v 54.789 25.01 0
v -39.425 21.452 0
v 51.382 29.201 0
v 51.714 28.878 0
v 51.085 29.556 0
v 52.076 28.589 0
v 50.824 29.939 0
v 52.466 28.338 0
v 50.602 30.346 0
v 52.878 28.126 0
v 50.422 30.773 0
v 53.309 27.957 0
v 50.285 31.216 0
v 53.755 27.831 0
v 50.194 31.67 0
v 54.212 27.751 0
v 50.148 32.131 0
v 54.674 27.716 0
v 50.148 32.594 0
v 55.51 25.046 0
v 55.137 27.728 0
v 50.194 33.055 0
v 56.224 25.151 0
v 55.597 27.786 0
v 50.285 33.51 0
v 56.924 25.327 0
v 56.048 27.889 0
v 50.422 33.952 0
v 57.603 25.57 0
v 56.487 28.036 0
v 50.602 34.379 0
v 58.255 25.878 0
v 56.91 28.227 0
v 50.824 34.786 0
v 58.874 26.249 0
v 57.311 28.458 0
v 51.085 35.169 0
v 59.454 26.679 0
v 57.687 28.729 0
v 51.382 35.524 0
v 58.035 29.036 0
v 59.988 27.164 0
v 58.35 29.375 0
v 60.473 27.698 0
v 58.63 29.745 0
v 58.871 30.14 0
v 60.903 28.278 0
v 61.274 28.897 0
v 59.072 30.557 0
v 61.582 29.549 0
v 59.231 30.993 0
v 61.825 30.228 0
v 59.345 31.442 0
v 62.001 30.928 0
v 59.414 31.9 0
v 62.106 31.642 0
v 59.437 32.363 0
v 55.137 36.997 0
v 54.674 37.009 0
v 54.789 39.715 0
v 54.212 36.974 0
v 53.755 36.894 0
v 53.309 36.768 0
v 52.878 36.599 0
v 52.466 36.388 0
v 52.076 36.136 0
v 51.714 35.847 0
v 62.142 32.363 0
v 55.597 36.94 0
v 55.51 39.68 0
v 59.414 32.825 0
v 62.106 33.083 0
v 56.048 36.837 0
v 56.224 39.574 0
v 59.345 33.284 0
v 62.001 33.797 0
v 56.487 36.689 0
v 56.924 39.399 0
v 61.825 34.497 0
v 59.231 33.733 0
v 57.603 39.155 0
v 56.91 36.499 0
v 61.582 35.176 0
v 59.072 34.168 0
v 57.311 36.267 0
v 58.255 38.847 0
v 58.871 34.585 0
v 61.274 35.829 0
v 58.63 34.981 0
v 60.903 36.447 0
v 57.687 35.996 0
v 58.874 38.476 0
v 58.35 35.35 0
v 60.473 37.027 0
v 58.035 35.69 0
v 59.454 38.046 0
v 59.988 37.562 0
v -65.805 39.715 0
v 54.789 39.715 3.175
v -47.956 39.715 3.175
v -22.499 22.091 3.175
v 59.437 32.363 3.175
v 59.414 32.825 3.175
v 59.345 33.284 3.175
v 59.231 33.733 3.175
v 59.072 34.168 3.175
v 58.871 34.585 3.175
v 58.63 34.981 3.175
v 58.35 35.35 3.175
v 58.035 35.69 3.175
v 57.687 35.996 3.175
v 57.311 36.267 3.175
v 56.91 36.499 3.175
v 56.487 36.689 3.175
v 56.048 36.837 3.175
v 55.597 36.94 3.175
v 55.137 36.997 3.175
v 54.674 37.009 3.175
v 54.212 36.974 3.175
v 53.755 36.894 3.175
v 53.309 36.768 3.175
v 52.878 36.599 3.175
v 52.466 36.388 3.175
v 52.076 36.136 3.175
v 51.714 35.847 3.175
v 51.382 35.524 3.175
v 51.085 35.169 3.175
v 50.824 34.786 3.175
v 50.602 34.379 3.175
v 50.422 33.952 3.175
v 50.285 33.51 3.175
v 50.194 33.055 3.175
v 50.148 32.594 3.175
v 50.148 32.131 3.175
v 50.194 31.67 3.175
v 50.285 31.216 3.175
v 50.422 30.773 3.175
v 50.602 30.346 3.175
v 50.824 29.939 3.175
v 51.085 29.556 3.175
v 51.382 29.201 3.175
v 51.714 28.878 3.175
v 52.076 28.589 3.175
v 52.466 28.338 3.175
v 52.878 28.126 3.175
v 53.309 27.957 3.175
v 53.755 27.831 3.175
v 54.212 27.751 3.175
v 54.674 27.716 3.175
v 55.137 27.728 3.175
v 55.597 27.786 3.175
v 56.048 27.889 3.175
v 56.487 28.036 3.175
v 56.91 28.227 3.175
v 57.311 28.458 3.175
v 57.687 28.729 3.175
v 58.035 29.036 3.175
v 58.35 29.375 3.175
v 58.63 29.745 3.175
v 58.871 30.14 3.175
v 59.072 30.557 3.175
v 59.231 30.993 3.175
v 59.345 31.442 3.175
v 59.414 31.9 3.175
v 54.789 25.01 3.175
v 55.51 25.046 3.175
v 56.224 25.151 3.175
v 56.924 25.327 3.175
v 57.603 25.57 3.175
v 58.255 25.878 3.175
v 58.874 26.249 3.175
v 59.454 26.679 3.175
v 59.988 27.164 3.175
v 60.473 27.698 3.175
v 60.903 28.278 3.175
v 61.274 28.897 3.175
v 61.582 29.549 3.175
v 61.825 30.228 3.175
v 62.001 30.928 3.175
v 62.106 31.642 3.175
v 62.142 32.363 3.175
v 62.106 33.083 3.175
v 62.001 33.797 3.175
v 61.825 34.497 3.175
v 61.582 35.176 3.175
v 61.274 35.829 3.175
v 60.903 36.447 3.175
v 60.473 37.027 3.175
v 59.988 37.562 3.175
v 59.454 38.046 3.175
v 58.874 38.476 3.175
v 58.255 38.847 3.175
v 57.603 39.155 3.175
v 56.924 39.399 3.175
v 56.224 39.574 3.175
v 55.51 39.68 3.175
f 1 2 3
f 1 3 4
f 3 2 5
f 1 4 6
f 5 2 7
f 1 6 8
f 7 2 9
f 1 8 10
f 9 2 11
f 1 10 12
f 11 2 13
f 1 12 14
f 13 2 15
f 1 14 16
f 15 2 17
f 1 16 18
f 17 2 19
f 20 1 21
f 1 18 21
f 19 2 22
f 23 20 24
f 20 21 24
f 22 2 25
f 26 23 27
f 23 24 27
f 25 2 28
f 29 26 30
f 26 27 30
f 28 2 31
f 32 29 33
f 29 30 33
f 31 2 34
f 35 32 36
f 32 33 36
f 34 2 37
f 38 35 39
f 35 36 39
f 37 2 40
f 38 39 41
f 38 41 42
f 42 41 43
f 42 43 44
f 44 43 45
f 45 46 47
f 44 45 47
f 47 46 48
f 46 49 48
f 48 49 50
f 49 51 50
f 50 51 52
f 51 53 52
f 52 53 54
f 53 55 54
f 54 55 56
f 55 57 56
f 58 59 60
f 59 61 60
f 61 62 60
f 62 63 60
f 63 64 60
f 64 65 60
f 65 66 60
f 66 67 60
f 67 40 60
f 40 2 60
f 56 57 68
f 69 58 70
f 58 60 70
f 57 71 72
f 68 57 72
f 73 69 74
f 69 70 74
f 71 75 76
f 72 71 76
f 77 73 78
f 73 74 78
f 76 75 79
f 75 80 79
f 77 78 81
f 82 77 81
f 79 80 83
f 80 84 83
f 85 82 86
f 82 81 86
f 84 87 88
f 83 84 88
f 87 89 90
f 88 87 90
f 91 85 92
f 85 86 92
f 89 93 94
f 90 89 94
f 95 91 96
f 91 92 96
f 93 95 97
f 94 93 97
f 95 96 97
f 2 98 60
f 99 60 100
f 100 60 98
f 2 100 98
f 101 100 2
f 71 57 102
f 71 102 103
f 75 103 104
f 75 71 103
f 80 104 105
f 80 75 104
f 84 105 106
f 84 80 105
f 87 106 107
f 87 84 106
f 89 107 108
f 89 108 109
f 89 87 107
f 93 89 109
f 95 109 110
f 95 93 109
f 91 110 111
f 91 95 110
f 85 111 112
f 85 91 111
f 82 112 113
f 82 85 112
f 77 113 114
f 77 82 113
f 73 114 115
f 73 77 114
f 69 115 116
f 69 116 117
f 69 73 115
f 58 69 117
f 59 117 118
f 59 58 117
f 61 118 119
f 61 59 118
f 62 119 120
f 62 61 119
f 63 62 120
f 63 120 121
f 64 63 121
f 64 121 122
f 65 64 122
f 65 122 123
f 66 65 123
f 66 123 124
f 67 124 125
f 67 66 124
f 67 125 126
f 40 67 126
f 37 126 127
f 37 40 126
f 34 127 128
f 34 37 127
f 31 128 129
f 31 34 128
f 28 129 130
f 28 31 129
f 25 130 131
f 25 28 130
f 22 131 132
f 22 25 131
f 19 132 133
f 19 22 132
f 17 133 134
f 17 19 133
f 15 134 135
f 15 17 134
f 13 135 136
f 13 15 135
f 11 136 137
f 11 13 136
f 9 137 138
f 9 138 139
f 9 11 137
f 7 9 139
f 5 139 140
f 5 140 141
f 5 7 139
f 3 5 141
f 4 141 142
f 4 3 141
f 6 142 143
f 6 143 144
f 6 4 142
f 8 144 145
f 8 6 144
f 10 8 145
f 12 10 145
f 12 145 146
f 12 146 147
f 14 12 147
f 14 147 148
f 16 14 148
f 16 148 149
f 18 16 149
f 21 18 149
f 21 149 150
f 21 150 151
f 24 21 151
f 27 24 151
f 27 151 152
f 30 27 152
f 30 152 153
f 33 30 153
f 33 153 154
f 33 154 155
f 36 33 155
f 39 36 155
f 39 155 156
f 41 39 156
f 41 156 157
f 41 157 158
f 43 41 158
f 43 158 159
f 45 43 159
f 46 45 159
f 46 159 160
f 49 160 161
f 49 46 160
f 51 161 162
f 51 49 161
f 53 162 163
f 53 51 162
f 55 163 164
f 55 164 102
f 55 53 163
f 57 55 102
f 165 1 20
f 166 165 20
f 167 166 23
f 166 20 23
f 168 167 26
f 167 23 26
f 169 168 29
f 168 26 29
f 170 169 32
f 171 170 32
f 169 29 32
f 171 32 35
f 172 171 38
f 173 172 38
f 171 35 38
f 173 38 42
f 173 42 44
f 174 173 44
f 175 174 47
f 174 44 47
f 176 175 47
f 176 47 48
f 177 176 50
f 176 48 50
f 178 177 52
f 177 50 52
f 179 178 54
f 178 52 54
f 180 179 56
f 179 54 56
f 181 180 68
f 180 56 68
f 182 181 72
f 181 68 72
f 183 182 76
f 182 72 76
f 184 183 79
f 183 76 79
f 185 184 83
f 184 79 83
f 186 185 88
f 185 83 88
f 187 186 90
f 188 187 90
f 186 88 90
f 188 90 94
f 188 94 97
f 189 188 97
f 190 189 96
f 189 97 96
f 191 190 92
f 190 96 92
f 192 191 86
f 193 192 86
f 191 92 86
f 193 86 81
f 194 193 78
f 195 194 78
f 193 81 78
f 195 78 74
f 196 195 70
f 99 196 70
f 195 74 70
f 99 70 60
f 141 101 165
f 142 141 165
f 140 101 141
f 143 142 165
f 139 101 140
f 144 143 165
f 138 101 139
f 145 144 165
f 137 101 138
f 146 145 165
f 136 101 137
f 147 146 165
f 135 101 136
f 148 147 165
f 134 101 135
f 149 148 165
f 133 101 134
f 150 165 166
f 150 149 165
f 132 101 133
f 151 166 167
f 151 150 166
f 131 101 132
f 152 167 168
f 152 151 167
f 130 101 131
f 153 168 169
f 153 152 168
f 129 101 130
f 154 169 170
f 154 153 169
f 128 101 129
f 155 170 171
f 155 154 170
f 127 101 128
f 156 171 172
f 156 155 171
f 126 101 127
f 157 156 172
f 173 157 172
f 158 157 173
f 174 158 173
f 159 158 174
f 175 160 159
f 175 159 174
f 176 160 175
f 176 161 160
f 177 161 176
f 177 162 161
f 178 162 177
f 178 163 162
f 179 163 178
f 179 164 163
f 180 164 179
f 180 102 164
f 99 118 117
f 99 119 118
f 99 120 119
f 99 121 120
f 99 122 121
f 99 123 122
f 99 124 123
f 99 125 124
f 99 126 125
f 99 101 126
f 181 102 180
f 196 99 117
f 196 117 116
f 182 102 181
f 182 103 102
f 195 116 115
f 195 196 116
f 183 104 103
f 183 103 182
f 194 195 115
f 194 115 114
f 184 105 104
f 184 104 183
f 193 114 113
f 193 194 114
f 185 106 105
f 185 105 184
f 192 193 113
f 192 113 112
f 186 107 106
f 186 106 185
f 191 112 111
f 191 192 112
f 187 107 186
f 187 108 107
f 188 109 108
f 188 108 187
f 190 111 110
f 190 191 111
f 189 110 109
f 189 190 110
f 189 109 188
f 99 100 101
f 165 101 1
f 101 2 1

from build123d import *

# Parameters (mm, degrees)
F0_R     = 4.6477092711
F1_DEPTH = 3.175
F2_SIZE2 = 10.15999
F2_SIZE  = 3.17499


# Not quite as in the source:
# - a fillet or chamfer is up to 0.001 mm smaller than in the source, because OpenCascade refuses the exact size


with BuildPart() as f1:
    # F0 (on Top) → F1 (new body)
    with BuildSketch(Plane.XY):
        with BuildLine():
            Line((54.7894574702, 39.7151075304), (-65.8053308725, 39.7151075304))
            Line((-65.8053308725, 39.7151075304), (-39.4252166152, 21.4519556612))
            Line((-39.4252166152, 21.4519556612), (54.7894574702, 25.0102191872))
            ThreePointArc((54.7894574702, 25.0102191872), (62.1419016418, 32.3626633588), (54.7894574702, 39.7151075304))
        make_face()
        with Locations((54.7894574702, 32.3626633588)):
            Circle(F0_R, mode=Mode.SUBTRACT)
    extrude(amount=F1_DEPTH)

    # F2 (size 3.175 and 10.16 in the source; OpenCascade refuses exactly that, so slightly less here)
    f2_edges = [f1.edges().sort_by_distance(p)[0] for p in [
        (-52.615274, 30.583532, 3.175),
    ]]
    f2_side = f1.faces().sort_by_distance((-52.615274, 30.583532, 1.5875))[0]
    chamfer(f2_edges, length=F2_SIZE, length2=F2_SIZE2, reference=f2_side)


solid = f1.part
